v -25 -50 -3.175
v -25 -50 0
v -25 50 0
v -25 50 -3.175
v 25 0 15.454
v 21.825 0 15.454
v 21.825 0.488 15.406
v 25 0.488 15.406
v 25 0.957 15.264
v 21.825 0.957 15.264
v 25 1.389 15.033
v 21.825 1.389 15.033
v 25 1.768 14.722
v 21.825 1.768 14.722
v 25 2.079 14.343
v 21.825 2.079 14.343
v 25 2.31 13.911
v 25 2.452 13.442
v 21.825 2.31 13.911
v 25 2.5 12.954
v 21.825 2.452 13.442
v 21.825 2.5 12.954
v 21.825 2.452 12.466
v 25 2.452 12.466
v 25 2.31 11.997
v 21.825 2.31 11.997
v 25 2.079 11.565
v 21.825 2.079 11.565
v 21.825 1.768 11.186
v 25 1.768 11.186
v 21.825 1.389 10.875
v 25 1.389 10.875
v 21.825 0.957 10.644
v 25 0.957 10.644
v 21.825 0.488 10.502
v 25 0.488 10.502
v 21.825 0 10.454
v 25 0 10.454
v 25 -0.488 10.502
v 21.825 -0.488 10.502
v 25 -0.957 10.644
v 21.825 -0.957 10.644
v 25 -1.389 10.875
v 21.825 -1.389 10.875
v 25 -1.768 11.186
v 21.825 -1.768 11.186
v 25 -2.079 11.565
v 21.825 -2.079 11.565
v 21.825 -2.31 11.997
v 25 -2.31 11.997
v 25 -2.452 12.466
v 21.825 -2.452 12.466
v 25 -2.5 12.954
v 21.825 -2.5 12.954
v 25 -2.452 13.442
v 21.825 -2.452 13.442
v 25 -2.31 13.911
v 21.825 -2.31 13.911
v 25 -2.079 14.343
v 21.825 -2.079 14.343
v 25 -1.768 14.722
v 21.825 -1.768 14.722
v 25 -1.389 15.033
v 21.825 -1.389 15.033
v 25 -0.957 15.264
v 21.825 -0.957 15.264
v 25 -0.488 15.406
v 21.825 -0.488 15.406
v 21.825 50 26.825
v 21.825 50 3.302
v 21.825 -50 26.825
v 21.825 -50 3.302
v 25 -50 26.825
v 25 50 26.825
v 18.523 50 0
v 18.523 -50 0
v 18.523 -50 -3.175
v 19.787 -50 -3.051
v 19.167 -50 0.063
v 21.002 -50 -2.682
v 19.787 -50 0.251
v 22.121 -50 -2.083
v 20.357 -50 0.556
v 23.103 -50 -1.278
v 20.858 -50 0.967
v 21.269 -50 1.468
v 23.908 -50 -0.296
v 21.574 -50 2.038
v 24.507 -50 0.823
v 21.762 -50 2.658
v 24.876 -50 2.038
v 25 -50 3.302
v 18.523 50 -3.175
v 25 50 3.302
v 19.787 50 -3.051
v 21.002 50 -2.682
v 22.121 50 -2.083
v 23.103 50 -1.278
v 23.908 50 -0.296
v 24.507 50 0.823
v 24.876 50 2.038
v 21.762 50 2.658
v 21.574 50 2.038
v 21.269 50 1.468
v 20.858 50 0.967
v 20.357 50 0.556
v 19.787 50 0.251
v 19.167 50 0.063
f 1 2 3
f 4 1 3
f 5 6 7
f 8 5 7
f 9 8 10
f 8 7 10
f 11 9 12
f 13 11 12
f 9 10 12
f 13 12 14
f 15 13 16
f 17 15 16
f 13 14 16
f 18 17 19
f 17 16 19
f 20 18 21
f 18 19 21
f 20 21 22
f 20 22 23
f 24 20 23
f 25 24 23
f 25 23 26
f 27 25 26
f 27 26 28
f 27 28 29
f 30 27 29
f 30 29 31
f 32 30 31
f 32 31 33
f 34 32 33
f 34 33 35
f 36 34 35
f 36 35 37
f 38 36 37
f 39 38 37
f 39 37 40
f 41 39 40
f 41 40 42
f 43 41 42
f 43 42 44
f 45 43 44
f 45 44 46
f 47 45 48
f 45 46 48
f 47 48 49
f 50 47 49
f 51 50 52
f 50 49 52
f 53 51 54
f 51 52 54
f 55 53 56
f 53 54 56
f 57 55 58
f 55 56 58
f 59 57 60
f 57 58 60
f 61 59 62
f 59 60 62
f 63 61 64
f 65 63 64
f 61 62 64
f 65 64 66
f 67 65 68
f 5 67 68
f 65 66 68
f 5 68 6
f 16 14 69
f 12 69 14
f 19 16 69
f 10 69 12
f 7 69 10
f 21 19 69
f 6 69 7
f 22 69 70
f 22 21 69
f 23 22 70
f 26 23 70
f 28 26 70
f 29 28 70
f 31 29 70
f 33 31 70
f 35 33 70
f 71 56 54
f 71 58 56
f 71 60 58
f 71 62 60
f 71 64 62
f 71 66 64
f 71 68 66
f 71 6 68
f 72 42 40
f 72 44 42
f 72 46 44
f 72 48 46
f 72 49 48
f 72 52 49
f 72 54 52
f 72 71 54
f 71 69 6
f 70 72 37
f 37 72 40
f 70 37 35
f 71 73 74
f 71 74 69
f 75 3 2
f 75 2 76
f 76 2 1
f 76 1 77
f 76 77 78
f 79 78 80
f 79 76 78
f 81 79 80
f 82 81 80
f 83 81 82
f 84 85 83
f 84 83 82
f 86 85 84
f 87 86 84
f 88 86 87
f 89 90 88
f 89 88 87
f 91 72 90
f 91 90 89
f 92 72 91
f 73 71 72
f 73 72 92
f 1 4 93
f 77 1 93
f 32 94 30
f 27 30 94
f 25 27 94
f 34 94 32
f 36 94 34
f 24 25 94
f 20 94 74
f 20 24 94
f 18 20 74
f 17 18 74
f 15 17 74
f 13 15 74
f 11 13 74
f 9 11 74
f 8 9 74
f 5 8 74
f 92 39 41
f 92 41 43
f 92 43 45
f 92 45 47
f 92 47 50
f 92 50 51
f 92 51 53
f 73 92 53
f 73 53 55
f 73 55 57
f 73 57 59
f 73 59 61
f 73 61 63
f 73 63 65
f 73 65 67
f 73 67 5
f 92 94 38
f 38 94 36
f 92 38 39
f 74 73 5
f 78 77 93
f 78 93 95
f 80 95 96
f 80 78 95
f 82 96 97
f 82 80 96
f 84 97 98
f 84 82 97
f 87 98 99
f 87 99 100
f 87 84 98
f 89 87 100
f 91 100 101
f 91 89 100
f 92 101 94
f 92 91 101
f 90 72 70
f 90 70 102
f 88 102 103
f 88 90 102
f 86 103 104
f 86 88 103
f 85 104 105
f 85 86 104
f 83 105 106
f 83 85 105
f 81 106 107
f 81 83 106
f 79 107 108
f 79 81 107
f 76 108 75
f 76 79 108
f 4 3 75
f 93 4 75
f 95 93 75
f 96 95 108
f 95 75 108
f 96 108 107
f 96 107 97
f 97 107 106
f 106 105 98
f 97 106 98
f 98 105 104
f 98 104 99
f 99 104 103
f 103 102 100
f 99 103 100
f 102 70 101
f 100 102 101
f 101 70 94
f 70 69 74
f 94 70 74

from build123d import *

# Parameters (mm, degrees)
SKETCH1_W                    = 50
SKETCH1_H                    = 100
BASE_FLANGE2_DEPTH           = 3.175
EDGE_FLANGE1_STRIP_W         = 19.304
EDGE_FLANGE1_STRIP_H         = 3.175
EDGE_FLANGE1_STRIP_CUT_DEPTH = 100
EDGE_FLANGE1_DEPTH           = 100
F_5_0MM_DOWEL_HOLE1_D        = 5


# Sheet-metal steps are written as plain solids
with BuildPart() as part:
    # Sketch1 → Base-Flange2 (new body)
    with BuildSketch(Plane.XY):
        Rectangle(SKETCH1_W, SKETCH1_H)
    extrude(amount=-BASE_FLANGE2_DEPTH)

    # Edge-Flange1 strip (across the edge) → Edge-Flange1 strip cut (cut)
    with BuildSketch(Plane(origin=(25, -50, 0), x_dir=(-1, 0, 0), z_dir=(0, 1, 0))):
        with Locations((-3.175, -1.5875)):
            Rectangle(EDGE_FLANGE1_STRIP_W, EDGE_FLANGE1_STRIP_H)
    extrude(amount=EDGE_FLANGE1_STRIP_CUT_DEPTH, mode=Mode.SUBTRACT)

    # Edge-Flange1 section (across the edge) → Edge-Flange1 (add)
    with BuildSketch(Plane(origin=(25, -50, 0), x_dir=(-1, 0, 0), z_dir=(0, 1, 0))):
        with BuildLine():
            Line((0, 3.302), (0, 26.825))
            Line((0, 26.825), (3.175, 26.825))
            Line((3.175, 26.825), (3.175, 3.302))
            ThreePointArc((3.175, 3.302), (4.142133409, 0.967133409), (6.477, 0))
            Line((6.477, 0), (6.477, -3.175))
            ThreePointArc((6.477, -3.175), (1.897069378, -1.277930622), (0, 3.302))
        make_face()
    extrude(amount=EDGE_FLANGE1_DEPTH)

    # Ø5.0mm Dowel Hole1 (through all)
    with Locations(Plane(origin=(25, 0, 0), x_dir=(0, 0, -1), z_dir=(1, 0, 0))):
        with Locations((-12.954, 0)):
            Hole(F_5_0MM_DOWEL_HOLE1_D / 2)


solid = part.part
